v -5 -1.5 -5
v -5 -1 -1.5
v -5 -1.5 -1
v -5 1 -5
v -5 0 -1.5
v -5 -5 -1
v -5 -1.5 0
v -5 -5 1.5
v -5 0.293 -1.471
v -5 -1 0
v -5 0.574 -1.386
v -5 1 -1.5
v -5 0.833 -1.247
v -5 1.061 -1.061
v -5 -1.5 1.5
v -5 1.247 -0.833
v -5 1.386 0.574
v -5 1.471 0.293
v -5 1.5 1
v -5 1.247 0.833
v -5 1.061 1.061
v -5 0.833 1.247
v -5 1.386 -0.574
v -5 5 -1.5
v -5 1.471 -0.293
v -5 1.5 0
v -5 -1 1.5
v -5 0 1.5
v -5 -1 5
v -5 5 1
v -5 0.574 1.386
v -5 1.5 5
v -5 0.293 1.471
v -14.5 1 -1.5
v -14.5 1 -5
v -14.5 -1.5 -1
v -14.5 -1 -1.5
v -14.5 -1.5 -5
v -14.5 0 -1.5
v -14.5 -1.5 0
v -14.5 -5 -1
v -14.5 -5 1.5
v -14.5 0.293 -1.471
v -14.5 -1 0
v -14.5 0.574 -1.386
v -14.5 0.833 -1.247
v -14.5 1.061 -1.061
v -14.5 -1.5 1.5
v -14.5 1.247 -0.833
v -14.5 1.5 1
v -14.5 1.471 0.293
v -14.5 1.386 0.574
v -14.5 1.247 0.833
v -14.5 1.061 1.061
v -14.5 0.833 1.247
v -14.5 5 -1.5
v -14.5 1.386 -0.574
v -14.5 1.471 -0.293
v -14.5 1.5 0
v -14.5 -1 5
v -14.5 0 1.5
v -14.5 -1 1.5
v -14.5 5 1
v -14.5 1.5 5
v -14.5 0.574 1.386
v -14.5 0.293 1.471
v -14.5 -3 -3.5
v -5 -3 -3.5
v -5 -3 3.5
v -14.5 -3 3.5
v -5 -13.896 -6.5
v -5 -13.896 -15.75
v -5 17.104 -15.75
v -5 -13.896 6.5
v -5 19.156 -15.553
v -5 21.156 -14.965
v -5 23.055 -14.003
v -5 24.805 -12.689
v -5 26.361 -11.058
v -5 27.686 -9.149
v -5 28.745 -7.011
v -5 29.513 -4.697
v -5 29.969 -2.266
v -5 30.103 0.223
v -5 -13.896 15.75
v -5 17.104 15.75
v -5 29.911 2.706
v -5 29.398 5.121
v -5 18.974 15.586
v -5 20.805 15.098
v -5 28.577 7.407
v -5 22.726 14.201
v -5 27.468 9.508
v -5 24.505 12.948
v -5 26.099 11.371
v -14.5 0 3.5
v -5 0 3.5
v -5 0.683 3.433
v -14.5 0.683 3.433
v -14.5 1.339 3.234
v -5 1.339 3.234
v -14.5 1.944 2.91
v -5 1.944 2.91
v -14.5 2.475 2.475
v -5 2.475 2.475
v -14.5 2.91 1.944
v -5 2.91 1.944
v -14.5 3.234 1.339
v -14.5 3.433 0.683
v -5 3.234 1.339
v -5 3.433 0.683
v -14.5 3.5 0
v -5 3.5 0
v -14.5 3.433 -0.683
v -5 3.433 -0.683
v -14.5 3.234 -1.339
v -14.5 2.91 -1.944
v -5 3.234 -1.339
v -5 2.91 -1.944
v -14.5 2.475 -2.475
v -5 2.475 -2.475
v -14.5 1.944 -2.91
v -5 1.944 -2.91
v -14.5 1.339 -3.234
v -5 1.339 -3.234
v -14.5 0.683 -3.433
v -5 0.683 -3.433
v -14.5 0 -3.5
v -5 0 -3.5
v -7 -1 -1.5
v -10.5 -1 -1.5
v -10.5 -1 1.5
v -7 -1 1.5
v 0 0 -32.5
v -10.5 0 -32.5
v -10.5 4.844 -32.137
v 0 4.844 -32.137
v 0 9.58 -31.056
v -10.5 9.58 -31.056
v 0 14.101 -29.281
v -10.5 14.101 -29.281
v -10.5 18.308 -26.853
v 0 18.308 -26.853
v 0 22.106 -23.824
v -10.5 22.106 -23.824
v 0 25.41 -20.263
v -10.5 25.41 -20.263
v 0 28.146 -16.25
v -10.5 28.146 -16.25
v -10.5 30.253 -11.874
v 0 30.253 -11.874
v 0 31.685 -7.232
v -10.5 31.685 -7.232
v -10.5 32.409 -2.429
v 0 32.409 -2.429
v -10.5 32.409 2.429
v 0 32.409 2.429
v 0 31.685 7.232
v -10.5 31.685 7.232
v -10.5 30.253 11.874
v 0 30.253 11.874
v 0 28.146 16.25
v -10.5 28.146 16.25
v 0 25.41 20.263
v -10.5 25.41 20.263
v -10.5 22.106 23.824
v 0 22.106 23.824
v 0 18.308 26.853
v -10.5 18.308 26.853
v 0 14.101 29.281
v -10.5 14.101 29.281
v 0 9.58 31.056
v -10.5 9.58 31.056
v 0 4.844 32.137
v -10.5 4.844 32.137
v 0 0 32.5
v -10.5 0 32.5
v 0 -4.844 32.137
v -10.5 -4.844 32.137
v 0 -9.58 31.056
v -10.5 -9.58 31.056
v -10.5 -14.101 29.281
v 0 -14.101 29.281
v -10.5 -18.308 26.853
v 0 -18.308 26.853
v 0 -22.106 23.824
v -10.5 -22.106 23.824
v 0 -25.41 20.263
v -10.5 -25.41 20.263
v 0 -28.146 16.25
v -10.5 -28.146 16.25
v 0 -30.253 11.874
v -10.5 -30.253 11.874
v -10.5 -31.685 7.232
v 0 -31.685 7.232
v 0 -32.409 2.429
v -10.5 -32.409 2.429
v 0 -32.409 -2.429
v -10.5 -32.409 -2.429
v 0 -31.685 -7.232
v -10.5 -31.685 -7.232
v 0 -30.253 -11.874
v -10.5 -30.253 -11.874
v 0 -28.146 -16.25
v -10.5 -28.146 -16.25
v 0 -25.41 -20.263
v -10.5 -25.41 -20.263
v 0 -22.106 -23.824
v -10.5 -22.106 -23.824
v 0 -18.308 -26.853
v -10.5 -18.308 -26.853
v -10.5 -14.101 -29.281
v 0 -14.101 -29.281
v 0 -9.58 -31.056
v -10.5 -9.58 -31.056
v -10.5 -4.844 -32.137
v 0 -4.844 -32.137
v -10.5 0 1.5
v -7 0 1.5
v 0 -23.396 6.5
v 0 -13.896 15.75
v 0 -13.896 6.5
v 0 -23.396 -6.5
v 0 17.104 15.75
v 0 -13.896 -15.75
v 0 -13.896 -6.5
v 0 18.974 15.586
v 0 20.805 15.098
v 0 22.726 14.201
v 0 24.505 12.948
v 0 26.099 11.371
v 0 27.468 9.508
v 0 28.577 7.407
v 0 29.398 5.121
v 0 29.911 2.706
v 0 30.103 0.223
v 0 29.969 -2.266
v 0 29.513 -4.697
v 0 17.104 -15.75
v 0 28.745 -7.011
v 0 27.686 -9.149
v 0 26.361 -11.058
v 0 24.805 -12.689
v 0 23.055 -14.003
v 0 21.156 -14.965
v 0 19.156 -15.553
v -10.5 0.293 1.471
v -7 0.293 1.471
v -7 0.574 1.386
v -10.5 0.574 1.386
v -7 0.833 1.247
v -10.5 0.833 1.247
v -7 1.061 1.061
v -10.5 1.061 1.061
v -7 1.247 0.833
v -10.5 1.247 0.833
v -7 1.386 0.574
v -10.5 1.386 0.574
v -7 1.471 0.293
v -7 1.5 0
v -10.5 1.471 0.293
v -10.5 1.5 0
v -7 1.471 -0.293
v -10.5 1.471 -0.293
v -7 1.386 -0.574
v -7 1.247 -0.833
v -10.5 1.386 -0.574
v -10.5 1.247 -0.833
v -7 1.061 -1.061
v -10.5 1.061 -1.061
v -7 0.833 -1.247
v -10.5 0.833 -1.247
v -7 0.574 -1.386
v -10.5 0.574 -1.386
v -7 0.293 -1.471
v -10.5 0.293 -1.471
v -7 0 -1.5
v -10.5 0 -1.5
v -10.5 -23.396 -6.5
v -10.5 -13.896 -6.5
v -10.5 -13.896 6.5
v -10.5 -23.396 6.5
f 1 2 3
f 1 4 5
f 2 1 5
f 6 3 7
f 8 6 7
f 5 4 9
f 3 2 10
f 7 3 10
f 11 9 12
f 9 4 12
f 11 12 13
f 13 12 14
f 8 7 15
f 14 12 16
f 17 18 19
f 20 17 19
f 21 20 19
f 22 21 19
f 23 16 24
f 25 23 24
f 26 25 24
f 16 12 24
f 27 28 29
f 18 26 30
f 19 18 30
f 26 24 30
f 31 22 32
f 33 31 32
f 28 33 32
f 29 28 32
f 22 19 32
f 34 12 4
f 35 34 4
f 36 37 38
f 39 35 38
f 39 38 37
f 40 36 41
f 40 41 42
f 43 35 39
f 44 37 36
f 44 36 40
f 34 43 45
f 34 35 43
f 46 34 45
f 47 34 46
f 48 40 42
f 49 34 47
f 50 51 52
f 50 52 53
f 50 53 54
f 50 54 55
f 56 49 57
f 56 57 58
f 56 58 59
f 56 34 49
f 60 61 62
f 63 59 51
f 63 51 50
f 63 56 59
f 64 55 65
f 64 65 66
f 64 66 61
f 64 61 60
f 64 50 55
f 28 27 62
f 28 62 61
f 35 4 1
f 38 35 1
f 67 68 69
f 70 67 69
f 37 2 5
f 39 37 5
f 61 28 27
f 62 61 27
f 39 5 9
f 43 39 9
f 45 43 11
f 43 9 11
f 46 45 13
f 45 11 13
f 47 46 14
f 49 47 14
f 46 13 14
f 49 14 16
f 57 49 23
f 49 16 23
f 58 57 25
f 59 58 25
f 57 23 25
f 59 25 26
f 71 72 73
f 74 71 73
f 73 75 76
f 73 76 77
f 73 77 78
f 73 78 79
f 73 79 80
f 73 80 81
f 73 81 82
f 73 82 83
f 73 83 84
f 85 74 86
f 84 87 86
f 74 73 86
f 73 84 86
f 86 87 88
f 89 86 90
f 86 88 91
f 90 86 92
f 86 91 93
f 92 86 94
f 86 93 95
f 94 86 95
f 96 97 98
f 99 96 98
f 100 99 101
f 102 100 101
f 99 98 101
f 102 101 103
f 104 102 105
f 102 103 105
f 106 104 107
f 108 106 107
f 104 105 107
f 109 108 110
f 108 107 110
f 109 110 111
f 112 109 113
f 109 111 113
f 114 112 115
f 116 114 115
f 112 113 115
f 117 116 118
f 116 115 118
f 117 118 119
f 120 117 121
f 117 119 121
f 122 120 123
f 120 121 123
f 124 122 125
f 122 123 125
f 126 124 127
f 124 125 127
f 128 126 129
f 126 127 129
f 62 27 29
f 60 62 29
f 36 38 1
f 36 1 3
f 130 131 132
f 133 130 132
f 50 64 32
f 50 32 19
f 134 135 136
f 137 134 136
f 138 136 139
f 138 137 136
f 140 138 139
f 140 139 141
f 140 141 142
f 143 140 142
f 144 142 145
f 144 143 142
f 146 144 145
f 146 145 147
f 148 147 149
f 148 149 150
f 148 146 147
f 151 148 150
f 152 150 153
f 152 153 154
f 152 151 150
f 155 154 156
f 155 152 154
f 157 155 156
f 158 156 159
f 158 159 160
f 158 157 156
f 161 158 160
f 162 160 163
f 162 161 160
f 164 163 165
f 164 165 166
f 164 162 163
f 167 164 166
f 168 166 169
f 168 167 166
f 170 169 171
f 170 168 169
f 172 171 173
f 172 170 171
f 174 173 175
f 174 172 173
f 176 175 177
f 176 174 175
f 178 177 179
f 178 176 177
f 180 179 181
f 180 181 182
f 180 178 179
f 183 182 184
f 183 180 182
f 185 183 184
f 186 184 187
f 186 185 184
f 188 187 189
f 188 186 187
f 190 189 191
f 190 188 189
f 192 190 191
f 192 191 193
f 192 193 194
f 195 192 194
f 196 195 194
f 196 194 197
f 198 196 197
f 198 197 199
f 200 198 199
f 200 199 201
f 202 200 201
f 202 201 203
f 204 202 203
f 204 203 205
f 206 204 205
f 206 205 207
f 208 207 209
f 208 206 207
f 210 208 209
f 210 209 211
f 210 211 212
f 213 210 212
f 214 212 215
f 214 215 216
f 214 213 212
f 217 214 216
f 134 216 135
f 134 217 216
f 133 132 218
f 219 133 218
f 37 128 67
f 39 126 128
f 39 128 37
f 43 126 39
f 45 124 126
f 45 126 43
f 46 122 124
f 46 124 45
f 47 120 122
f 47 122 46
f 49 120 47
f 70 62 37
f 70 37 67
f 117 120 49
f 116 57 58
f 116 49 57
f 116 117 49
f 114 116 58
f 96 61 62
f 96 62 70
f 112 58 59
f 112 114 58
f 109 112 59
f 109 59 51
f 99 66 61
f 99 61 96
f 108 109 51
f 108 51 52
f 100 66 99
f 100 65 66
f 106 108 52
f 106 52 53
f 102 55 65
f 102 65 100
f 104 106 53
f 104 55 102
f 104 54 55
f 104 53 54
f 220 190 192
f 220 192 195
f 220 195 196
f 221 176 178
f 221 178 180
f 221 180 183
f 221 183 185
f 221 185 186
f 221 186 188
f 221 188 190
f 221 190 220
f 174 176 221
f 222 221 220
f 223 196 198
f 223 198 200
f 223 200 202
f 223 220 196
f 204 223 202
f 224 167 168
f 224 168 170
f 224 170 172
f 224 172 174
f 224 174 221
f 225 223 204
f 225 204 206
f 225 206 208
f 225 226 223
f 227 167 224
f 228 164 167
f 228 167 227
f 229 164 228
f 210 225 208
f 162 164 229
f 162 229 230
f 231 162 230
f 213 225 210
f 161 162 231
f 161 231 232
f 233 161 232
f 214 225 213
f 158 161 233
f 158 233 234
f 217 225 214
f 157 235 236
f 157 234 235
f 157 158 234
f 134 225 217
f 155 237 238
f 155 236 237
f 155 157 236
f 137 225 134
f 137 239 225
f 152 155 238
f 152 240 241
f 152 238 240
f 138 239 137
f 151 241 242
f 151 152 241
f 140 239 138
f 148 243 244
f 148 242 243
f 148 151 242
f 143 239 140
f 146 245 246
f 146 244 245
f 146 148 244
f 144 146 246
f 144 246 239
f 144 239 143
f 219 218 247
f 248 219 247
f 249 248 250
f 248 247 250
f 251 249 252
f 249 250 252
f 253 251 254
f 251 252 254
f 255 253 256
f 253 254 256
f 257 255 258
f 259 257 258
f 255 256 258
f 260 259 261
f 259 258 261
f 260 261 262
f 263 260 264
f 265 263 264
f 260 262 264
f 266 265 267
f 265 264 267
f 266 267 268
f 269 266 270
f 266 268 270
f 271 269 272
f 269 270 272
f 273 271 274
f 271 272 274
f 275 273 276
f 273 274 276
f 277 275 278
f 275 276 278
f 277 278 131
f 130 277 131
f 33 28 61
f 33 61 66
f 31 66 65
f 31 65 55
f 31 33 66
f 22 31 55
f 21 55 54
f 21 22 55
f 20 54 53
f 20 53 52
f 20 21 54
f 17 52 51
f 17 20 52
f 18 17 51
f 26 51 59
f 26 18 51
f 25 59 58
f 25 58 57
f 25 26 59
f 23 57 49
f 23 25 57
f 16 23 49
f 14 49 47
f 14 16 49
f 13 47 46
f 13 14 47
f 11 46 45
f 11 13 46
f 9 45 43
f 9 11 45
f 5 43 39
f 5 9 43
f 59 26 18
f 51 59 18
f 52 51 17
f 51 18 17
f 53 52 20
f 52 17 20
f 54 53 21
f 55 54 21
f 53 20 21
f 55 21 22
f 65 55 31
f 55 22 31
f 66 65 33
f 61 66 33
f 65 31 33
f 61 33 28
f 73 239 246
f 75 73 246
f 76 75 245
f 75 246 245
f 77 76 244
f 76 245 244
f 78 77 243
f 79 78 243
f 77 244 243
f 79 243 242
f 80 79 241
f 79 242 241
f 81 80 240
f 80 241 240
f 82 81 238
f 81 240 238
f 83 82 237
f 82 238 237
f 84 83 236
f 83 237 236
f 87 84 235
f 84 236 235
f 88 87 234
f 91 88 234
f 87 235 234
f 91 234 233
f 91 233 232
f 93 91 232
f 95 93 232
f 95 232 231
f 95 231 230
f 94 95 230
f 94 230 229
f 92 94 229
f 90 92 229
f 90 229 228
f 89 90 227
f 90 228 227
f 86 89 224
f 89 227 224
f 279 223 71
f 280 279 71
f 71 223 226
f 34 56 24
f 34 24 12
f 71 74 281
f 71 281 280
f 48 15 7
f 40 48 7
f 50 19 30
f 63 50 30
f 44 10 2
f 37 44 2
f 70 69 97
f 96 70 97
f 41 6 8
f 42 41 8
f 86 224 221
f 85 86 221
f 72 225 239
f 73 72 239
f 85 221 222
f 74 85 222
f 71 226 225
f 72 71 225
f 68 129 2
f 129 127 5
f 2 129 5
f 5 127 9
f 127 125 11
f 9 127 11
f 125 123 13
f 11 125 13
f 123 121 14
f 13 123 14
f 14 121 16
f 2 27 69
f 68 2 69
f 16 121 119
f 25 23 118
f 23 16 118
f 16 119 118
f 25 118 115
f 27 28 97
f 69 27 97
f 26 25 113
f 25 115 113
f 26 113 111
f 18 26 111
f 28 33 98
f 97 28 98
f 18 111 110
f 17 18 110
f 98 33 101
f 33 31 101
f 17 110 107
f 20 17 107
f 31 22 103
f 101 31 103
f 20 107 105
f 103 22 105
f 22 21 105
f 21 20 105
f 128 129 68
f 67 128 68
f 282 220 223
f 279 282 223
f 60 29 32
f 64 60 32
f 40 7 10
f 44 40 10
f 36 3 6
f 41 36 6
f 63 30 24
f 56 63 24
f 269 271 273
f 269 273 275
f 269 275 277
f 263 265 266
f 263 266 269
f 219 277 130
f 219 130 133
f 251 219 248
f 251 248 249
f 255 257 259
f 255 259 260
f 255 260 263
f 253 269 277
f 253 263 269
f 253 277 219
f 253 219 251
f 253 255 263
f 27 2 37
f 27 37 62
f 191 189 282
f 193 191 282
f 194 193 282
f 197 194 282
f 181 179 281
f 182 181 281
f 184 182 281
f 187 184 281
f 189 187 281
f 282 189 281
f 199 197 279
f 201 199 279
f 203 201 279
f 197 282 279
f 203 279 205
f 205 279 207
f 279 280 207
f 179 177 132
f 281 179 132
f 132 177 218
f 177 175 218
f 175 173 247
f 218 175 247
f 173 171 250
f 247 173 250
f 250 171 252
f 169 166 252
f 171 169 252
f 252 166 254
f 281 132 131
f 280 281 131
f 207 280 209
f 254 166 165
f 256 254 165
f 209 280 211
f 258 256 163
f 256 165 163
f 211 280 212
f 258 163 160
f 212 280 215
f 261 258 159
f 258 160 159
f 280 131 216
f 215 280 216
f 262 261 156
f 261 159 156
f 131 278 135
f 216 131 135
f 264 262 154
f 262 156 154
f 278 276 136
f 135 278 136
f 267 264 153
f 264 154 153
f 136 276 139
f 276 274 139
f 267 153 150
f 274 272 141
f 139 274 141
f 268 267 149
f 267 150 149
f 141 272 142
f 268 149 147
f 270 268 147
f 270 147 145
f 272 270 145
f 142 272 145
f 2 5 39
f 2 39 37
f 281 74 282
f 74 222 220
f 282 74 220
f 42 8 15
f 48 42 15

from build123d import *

# Parameters (mm, degrees)
SKETCH2_R                = 32.5
BOSS_EXTRUDE1_DEPTH      = 10.5
SKETCH3_W                = 13
SKETCH3_H                = 4.5
SKETCH3_H_2              = 5
CUT_EXTRUDE1_DEPTH       = 48.146049675
SKETCH3_3_RX             = 15.75
SKETCH3_3_RY             = 13
CUT_EXTRUDE6_DEPTH       = 5
EXTRUDE_THIN1_DEPTH      = 4
EXTRUDE_THIN1_DEPTH_BACK = 5.5
BOSS_EXTRUDE8_DEPTH      = 4
BOSS_EXTRUDE8_DEPTH_BACK = 5.5
CUT_EXTRUDE5_DEPTH       = 3.5


with BuildPart() as part:
    # Sketch2 → Boss-Extrude1 (new body)
    with BuildSketch(Plane(origin=(0, 0, 0), x_dir=(0, 0, -1), z_dir=(1, 0, 0))):
        Circle(SKETCH2_R)
    extrude(amount=-BOSS_EXTRUDE1_DEPTH)

    # Sketch3 → Cut-Extrude1 (cut, through all)
    with BuildSketch(Plane(origin=(0, 0, 0), x_dir=(0, 0, -1), z_dir=(1, 0, 0))):
        with Locations((0, -21.145823157)):
            Rectangle(SKETCH3_W, SKETCH3_H)
        with Locations((0, -16.395823157)):
            Rectangle(SKETCH3_W, SKETCH3_H_2)
    extrude(amount=-CUT_EXTRUDE1_DEPTH, mode=Mode.SUBTRACT)

    # Sketch3<3> → Cut-Extrude6 (cut)
    with BuildSketch(Plane(origin=(0, 0, 0), x_dir=(0, 0, -1), z_dir=(1, 0, 0))):
        with BuildLine():
            add(Edge.make_bspline(
                [(-15.75, 17.104176843), (-15.75, 4.104176843), (0, 4.104176843), (15.75, 4.104176843), (15.75, 17.104176843)],
                knots=[3.141592654, 3.141592654, 3.141592654, 4.71238898, 4.71238898, 6.283185307, 6.283185307, 6.283185307], degree=2, weights=[1, 0.707106781, 1, 0.707106781, 1]))
            Line((-15.75, 17.104176843), (-15.75, -13.895823157))
            Line((-15.75, -13.895823157), (-6.5, -13.895823157))
            Line((-6.5, -13.895823157), (6.5, -13.895823157))
            Line((6.5, -13.895823157), (15.75, -13.895823157))
            Line((15.75, -13.895823157), (15.75, 17.104176843))
        make_face()
        with Locations((0, 17.104176843)):
            Ellipse(SKETCH3_3_RX, SKETCH3_3_RY)
    extrude(amount=-CUT_EXTRUDE6_DEPTH, mode=Mode.SUBTRACT)

    # Sketch10 → Cut-Extrude5 (cut)
    with BuildSketch(Plane.ZY.offset(10.5)):
        with BuildLine():
            Line((1.5, -1), (1.5, 0))
            ThreePointArc((1.5, 0), (0, 1.5), (-1.5, 0))
            Line((-1.5, 0), (-1.5, -1))
            Line((-1.5, -1), (1.5, -1))
        make_face()
    extrude(amount=-CUT_EXTRUDE5_DEPTH, mode=Mode.SUBTRACT)


with BuildPart() as body_2:
    # Sketch5 → Extrude-Thin1 (new, two sides: drawn at the far end of the back side and taken through both)
    with BuildSketch(Plane.ZY.offset(10.5).offset(-EXTRUDE_THIN1_DEPTH_BACK)):
        with BuildLine():
            Line((-3.5, 0), (-3.5, -3))
            Line((-3.5, -3), (3.5, -3))
            Line((3.5, -3), (3.5, 0))
            ThreePointArc((3.5, 0), (0, 3.5), (-3.5, 0))
        make_face()
        with BuildLine():
            Line((-1.5, 0), (-1.5, -1))
            Line((-1.5, -1), (1.5, -1))
            Line((1.5, -1), (1.5, 0))
            ThreePointArc((1.5, 0), (0, 1.5), (-1.5, 0))
        make_face(mode=Mode.SUBTRACT)
    extrude(amount=EXTRUDE_THIN1_DEPTH + EXTRUDE_THIN1_DEPTH_BACK)


with BuildPart() as body_3:
    # Sketch5<4> → Boss-Extrude8 (new, two sides: drawn at the far end of the back side and taken through both)
    with BuildSketch(Plane.ZY.offset(10.5).offset(-BOSS_EXTRUDE8_DEPTH_BACK)):
        Polygon((-1.5, -1), (-1.5, 0), (-1.5, 1), (-5, 1), (-5, -1.5), (-1, -1.5), (0, -1.5), (0, -1), align=None)
        with BuildLine():
            Line((-1.5, 1), (-1.5, 0))
            ThreePointArc((-1.5, 0), (-1.060660172, 1.060660172), (0, 1.5))
            Line((0, 1.5), (1, 1.5))
            Line((1, 1.5), (1, 5))
            Line((1, 5), (-1.5, 5))
            Line((-1.5, 5), (-1.5, 1))
        make_face()
        with BuildLine():
            Line((1, 1.5), (0, 1.5))
            ThreePointArc((0, 1.5), (1.060660172, 1.060660172), (1.5, 0))
            Line((1.5, 0), (1.5, -1))
            Line((1.5, -1), (5, -1))
            Line((5, -1), (5, 1.5))
            Line((5, 1.5), (1, 1.5))
        make_face()
        Polygon((1.5, -1.5), (0, -1.5), (-1, -1.5), (-1, -5), (1.5, -5), align=None)
    extrude(amount=BOSS_EXTRUDE8_DEPTH + BOSS_EXTRUDE8_DEPTH_BACK)


solid = Compound([part.part, body_2.part, body_3.part])
